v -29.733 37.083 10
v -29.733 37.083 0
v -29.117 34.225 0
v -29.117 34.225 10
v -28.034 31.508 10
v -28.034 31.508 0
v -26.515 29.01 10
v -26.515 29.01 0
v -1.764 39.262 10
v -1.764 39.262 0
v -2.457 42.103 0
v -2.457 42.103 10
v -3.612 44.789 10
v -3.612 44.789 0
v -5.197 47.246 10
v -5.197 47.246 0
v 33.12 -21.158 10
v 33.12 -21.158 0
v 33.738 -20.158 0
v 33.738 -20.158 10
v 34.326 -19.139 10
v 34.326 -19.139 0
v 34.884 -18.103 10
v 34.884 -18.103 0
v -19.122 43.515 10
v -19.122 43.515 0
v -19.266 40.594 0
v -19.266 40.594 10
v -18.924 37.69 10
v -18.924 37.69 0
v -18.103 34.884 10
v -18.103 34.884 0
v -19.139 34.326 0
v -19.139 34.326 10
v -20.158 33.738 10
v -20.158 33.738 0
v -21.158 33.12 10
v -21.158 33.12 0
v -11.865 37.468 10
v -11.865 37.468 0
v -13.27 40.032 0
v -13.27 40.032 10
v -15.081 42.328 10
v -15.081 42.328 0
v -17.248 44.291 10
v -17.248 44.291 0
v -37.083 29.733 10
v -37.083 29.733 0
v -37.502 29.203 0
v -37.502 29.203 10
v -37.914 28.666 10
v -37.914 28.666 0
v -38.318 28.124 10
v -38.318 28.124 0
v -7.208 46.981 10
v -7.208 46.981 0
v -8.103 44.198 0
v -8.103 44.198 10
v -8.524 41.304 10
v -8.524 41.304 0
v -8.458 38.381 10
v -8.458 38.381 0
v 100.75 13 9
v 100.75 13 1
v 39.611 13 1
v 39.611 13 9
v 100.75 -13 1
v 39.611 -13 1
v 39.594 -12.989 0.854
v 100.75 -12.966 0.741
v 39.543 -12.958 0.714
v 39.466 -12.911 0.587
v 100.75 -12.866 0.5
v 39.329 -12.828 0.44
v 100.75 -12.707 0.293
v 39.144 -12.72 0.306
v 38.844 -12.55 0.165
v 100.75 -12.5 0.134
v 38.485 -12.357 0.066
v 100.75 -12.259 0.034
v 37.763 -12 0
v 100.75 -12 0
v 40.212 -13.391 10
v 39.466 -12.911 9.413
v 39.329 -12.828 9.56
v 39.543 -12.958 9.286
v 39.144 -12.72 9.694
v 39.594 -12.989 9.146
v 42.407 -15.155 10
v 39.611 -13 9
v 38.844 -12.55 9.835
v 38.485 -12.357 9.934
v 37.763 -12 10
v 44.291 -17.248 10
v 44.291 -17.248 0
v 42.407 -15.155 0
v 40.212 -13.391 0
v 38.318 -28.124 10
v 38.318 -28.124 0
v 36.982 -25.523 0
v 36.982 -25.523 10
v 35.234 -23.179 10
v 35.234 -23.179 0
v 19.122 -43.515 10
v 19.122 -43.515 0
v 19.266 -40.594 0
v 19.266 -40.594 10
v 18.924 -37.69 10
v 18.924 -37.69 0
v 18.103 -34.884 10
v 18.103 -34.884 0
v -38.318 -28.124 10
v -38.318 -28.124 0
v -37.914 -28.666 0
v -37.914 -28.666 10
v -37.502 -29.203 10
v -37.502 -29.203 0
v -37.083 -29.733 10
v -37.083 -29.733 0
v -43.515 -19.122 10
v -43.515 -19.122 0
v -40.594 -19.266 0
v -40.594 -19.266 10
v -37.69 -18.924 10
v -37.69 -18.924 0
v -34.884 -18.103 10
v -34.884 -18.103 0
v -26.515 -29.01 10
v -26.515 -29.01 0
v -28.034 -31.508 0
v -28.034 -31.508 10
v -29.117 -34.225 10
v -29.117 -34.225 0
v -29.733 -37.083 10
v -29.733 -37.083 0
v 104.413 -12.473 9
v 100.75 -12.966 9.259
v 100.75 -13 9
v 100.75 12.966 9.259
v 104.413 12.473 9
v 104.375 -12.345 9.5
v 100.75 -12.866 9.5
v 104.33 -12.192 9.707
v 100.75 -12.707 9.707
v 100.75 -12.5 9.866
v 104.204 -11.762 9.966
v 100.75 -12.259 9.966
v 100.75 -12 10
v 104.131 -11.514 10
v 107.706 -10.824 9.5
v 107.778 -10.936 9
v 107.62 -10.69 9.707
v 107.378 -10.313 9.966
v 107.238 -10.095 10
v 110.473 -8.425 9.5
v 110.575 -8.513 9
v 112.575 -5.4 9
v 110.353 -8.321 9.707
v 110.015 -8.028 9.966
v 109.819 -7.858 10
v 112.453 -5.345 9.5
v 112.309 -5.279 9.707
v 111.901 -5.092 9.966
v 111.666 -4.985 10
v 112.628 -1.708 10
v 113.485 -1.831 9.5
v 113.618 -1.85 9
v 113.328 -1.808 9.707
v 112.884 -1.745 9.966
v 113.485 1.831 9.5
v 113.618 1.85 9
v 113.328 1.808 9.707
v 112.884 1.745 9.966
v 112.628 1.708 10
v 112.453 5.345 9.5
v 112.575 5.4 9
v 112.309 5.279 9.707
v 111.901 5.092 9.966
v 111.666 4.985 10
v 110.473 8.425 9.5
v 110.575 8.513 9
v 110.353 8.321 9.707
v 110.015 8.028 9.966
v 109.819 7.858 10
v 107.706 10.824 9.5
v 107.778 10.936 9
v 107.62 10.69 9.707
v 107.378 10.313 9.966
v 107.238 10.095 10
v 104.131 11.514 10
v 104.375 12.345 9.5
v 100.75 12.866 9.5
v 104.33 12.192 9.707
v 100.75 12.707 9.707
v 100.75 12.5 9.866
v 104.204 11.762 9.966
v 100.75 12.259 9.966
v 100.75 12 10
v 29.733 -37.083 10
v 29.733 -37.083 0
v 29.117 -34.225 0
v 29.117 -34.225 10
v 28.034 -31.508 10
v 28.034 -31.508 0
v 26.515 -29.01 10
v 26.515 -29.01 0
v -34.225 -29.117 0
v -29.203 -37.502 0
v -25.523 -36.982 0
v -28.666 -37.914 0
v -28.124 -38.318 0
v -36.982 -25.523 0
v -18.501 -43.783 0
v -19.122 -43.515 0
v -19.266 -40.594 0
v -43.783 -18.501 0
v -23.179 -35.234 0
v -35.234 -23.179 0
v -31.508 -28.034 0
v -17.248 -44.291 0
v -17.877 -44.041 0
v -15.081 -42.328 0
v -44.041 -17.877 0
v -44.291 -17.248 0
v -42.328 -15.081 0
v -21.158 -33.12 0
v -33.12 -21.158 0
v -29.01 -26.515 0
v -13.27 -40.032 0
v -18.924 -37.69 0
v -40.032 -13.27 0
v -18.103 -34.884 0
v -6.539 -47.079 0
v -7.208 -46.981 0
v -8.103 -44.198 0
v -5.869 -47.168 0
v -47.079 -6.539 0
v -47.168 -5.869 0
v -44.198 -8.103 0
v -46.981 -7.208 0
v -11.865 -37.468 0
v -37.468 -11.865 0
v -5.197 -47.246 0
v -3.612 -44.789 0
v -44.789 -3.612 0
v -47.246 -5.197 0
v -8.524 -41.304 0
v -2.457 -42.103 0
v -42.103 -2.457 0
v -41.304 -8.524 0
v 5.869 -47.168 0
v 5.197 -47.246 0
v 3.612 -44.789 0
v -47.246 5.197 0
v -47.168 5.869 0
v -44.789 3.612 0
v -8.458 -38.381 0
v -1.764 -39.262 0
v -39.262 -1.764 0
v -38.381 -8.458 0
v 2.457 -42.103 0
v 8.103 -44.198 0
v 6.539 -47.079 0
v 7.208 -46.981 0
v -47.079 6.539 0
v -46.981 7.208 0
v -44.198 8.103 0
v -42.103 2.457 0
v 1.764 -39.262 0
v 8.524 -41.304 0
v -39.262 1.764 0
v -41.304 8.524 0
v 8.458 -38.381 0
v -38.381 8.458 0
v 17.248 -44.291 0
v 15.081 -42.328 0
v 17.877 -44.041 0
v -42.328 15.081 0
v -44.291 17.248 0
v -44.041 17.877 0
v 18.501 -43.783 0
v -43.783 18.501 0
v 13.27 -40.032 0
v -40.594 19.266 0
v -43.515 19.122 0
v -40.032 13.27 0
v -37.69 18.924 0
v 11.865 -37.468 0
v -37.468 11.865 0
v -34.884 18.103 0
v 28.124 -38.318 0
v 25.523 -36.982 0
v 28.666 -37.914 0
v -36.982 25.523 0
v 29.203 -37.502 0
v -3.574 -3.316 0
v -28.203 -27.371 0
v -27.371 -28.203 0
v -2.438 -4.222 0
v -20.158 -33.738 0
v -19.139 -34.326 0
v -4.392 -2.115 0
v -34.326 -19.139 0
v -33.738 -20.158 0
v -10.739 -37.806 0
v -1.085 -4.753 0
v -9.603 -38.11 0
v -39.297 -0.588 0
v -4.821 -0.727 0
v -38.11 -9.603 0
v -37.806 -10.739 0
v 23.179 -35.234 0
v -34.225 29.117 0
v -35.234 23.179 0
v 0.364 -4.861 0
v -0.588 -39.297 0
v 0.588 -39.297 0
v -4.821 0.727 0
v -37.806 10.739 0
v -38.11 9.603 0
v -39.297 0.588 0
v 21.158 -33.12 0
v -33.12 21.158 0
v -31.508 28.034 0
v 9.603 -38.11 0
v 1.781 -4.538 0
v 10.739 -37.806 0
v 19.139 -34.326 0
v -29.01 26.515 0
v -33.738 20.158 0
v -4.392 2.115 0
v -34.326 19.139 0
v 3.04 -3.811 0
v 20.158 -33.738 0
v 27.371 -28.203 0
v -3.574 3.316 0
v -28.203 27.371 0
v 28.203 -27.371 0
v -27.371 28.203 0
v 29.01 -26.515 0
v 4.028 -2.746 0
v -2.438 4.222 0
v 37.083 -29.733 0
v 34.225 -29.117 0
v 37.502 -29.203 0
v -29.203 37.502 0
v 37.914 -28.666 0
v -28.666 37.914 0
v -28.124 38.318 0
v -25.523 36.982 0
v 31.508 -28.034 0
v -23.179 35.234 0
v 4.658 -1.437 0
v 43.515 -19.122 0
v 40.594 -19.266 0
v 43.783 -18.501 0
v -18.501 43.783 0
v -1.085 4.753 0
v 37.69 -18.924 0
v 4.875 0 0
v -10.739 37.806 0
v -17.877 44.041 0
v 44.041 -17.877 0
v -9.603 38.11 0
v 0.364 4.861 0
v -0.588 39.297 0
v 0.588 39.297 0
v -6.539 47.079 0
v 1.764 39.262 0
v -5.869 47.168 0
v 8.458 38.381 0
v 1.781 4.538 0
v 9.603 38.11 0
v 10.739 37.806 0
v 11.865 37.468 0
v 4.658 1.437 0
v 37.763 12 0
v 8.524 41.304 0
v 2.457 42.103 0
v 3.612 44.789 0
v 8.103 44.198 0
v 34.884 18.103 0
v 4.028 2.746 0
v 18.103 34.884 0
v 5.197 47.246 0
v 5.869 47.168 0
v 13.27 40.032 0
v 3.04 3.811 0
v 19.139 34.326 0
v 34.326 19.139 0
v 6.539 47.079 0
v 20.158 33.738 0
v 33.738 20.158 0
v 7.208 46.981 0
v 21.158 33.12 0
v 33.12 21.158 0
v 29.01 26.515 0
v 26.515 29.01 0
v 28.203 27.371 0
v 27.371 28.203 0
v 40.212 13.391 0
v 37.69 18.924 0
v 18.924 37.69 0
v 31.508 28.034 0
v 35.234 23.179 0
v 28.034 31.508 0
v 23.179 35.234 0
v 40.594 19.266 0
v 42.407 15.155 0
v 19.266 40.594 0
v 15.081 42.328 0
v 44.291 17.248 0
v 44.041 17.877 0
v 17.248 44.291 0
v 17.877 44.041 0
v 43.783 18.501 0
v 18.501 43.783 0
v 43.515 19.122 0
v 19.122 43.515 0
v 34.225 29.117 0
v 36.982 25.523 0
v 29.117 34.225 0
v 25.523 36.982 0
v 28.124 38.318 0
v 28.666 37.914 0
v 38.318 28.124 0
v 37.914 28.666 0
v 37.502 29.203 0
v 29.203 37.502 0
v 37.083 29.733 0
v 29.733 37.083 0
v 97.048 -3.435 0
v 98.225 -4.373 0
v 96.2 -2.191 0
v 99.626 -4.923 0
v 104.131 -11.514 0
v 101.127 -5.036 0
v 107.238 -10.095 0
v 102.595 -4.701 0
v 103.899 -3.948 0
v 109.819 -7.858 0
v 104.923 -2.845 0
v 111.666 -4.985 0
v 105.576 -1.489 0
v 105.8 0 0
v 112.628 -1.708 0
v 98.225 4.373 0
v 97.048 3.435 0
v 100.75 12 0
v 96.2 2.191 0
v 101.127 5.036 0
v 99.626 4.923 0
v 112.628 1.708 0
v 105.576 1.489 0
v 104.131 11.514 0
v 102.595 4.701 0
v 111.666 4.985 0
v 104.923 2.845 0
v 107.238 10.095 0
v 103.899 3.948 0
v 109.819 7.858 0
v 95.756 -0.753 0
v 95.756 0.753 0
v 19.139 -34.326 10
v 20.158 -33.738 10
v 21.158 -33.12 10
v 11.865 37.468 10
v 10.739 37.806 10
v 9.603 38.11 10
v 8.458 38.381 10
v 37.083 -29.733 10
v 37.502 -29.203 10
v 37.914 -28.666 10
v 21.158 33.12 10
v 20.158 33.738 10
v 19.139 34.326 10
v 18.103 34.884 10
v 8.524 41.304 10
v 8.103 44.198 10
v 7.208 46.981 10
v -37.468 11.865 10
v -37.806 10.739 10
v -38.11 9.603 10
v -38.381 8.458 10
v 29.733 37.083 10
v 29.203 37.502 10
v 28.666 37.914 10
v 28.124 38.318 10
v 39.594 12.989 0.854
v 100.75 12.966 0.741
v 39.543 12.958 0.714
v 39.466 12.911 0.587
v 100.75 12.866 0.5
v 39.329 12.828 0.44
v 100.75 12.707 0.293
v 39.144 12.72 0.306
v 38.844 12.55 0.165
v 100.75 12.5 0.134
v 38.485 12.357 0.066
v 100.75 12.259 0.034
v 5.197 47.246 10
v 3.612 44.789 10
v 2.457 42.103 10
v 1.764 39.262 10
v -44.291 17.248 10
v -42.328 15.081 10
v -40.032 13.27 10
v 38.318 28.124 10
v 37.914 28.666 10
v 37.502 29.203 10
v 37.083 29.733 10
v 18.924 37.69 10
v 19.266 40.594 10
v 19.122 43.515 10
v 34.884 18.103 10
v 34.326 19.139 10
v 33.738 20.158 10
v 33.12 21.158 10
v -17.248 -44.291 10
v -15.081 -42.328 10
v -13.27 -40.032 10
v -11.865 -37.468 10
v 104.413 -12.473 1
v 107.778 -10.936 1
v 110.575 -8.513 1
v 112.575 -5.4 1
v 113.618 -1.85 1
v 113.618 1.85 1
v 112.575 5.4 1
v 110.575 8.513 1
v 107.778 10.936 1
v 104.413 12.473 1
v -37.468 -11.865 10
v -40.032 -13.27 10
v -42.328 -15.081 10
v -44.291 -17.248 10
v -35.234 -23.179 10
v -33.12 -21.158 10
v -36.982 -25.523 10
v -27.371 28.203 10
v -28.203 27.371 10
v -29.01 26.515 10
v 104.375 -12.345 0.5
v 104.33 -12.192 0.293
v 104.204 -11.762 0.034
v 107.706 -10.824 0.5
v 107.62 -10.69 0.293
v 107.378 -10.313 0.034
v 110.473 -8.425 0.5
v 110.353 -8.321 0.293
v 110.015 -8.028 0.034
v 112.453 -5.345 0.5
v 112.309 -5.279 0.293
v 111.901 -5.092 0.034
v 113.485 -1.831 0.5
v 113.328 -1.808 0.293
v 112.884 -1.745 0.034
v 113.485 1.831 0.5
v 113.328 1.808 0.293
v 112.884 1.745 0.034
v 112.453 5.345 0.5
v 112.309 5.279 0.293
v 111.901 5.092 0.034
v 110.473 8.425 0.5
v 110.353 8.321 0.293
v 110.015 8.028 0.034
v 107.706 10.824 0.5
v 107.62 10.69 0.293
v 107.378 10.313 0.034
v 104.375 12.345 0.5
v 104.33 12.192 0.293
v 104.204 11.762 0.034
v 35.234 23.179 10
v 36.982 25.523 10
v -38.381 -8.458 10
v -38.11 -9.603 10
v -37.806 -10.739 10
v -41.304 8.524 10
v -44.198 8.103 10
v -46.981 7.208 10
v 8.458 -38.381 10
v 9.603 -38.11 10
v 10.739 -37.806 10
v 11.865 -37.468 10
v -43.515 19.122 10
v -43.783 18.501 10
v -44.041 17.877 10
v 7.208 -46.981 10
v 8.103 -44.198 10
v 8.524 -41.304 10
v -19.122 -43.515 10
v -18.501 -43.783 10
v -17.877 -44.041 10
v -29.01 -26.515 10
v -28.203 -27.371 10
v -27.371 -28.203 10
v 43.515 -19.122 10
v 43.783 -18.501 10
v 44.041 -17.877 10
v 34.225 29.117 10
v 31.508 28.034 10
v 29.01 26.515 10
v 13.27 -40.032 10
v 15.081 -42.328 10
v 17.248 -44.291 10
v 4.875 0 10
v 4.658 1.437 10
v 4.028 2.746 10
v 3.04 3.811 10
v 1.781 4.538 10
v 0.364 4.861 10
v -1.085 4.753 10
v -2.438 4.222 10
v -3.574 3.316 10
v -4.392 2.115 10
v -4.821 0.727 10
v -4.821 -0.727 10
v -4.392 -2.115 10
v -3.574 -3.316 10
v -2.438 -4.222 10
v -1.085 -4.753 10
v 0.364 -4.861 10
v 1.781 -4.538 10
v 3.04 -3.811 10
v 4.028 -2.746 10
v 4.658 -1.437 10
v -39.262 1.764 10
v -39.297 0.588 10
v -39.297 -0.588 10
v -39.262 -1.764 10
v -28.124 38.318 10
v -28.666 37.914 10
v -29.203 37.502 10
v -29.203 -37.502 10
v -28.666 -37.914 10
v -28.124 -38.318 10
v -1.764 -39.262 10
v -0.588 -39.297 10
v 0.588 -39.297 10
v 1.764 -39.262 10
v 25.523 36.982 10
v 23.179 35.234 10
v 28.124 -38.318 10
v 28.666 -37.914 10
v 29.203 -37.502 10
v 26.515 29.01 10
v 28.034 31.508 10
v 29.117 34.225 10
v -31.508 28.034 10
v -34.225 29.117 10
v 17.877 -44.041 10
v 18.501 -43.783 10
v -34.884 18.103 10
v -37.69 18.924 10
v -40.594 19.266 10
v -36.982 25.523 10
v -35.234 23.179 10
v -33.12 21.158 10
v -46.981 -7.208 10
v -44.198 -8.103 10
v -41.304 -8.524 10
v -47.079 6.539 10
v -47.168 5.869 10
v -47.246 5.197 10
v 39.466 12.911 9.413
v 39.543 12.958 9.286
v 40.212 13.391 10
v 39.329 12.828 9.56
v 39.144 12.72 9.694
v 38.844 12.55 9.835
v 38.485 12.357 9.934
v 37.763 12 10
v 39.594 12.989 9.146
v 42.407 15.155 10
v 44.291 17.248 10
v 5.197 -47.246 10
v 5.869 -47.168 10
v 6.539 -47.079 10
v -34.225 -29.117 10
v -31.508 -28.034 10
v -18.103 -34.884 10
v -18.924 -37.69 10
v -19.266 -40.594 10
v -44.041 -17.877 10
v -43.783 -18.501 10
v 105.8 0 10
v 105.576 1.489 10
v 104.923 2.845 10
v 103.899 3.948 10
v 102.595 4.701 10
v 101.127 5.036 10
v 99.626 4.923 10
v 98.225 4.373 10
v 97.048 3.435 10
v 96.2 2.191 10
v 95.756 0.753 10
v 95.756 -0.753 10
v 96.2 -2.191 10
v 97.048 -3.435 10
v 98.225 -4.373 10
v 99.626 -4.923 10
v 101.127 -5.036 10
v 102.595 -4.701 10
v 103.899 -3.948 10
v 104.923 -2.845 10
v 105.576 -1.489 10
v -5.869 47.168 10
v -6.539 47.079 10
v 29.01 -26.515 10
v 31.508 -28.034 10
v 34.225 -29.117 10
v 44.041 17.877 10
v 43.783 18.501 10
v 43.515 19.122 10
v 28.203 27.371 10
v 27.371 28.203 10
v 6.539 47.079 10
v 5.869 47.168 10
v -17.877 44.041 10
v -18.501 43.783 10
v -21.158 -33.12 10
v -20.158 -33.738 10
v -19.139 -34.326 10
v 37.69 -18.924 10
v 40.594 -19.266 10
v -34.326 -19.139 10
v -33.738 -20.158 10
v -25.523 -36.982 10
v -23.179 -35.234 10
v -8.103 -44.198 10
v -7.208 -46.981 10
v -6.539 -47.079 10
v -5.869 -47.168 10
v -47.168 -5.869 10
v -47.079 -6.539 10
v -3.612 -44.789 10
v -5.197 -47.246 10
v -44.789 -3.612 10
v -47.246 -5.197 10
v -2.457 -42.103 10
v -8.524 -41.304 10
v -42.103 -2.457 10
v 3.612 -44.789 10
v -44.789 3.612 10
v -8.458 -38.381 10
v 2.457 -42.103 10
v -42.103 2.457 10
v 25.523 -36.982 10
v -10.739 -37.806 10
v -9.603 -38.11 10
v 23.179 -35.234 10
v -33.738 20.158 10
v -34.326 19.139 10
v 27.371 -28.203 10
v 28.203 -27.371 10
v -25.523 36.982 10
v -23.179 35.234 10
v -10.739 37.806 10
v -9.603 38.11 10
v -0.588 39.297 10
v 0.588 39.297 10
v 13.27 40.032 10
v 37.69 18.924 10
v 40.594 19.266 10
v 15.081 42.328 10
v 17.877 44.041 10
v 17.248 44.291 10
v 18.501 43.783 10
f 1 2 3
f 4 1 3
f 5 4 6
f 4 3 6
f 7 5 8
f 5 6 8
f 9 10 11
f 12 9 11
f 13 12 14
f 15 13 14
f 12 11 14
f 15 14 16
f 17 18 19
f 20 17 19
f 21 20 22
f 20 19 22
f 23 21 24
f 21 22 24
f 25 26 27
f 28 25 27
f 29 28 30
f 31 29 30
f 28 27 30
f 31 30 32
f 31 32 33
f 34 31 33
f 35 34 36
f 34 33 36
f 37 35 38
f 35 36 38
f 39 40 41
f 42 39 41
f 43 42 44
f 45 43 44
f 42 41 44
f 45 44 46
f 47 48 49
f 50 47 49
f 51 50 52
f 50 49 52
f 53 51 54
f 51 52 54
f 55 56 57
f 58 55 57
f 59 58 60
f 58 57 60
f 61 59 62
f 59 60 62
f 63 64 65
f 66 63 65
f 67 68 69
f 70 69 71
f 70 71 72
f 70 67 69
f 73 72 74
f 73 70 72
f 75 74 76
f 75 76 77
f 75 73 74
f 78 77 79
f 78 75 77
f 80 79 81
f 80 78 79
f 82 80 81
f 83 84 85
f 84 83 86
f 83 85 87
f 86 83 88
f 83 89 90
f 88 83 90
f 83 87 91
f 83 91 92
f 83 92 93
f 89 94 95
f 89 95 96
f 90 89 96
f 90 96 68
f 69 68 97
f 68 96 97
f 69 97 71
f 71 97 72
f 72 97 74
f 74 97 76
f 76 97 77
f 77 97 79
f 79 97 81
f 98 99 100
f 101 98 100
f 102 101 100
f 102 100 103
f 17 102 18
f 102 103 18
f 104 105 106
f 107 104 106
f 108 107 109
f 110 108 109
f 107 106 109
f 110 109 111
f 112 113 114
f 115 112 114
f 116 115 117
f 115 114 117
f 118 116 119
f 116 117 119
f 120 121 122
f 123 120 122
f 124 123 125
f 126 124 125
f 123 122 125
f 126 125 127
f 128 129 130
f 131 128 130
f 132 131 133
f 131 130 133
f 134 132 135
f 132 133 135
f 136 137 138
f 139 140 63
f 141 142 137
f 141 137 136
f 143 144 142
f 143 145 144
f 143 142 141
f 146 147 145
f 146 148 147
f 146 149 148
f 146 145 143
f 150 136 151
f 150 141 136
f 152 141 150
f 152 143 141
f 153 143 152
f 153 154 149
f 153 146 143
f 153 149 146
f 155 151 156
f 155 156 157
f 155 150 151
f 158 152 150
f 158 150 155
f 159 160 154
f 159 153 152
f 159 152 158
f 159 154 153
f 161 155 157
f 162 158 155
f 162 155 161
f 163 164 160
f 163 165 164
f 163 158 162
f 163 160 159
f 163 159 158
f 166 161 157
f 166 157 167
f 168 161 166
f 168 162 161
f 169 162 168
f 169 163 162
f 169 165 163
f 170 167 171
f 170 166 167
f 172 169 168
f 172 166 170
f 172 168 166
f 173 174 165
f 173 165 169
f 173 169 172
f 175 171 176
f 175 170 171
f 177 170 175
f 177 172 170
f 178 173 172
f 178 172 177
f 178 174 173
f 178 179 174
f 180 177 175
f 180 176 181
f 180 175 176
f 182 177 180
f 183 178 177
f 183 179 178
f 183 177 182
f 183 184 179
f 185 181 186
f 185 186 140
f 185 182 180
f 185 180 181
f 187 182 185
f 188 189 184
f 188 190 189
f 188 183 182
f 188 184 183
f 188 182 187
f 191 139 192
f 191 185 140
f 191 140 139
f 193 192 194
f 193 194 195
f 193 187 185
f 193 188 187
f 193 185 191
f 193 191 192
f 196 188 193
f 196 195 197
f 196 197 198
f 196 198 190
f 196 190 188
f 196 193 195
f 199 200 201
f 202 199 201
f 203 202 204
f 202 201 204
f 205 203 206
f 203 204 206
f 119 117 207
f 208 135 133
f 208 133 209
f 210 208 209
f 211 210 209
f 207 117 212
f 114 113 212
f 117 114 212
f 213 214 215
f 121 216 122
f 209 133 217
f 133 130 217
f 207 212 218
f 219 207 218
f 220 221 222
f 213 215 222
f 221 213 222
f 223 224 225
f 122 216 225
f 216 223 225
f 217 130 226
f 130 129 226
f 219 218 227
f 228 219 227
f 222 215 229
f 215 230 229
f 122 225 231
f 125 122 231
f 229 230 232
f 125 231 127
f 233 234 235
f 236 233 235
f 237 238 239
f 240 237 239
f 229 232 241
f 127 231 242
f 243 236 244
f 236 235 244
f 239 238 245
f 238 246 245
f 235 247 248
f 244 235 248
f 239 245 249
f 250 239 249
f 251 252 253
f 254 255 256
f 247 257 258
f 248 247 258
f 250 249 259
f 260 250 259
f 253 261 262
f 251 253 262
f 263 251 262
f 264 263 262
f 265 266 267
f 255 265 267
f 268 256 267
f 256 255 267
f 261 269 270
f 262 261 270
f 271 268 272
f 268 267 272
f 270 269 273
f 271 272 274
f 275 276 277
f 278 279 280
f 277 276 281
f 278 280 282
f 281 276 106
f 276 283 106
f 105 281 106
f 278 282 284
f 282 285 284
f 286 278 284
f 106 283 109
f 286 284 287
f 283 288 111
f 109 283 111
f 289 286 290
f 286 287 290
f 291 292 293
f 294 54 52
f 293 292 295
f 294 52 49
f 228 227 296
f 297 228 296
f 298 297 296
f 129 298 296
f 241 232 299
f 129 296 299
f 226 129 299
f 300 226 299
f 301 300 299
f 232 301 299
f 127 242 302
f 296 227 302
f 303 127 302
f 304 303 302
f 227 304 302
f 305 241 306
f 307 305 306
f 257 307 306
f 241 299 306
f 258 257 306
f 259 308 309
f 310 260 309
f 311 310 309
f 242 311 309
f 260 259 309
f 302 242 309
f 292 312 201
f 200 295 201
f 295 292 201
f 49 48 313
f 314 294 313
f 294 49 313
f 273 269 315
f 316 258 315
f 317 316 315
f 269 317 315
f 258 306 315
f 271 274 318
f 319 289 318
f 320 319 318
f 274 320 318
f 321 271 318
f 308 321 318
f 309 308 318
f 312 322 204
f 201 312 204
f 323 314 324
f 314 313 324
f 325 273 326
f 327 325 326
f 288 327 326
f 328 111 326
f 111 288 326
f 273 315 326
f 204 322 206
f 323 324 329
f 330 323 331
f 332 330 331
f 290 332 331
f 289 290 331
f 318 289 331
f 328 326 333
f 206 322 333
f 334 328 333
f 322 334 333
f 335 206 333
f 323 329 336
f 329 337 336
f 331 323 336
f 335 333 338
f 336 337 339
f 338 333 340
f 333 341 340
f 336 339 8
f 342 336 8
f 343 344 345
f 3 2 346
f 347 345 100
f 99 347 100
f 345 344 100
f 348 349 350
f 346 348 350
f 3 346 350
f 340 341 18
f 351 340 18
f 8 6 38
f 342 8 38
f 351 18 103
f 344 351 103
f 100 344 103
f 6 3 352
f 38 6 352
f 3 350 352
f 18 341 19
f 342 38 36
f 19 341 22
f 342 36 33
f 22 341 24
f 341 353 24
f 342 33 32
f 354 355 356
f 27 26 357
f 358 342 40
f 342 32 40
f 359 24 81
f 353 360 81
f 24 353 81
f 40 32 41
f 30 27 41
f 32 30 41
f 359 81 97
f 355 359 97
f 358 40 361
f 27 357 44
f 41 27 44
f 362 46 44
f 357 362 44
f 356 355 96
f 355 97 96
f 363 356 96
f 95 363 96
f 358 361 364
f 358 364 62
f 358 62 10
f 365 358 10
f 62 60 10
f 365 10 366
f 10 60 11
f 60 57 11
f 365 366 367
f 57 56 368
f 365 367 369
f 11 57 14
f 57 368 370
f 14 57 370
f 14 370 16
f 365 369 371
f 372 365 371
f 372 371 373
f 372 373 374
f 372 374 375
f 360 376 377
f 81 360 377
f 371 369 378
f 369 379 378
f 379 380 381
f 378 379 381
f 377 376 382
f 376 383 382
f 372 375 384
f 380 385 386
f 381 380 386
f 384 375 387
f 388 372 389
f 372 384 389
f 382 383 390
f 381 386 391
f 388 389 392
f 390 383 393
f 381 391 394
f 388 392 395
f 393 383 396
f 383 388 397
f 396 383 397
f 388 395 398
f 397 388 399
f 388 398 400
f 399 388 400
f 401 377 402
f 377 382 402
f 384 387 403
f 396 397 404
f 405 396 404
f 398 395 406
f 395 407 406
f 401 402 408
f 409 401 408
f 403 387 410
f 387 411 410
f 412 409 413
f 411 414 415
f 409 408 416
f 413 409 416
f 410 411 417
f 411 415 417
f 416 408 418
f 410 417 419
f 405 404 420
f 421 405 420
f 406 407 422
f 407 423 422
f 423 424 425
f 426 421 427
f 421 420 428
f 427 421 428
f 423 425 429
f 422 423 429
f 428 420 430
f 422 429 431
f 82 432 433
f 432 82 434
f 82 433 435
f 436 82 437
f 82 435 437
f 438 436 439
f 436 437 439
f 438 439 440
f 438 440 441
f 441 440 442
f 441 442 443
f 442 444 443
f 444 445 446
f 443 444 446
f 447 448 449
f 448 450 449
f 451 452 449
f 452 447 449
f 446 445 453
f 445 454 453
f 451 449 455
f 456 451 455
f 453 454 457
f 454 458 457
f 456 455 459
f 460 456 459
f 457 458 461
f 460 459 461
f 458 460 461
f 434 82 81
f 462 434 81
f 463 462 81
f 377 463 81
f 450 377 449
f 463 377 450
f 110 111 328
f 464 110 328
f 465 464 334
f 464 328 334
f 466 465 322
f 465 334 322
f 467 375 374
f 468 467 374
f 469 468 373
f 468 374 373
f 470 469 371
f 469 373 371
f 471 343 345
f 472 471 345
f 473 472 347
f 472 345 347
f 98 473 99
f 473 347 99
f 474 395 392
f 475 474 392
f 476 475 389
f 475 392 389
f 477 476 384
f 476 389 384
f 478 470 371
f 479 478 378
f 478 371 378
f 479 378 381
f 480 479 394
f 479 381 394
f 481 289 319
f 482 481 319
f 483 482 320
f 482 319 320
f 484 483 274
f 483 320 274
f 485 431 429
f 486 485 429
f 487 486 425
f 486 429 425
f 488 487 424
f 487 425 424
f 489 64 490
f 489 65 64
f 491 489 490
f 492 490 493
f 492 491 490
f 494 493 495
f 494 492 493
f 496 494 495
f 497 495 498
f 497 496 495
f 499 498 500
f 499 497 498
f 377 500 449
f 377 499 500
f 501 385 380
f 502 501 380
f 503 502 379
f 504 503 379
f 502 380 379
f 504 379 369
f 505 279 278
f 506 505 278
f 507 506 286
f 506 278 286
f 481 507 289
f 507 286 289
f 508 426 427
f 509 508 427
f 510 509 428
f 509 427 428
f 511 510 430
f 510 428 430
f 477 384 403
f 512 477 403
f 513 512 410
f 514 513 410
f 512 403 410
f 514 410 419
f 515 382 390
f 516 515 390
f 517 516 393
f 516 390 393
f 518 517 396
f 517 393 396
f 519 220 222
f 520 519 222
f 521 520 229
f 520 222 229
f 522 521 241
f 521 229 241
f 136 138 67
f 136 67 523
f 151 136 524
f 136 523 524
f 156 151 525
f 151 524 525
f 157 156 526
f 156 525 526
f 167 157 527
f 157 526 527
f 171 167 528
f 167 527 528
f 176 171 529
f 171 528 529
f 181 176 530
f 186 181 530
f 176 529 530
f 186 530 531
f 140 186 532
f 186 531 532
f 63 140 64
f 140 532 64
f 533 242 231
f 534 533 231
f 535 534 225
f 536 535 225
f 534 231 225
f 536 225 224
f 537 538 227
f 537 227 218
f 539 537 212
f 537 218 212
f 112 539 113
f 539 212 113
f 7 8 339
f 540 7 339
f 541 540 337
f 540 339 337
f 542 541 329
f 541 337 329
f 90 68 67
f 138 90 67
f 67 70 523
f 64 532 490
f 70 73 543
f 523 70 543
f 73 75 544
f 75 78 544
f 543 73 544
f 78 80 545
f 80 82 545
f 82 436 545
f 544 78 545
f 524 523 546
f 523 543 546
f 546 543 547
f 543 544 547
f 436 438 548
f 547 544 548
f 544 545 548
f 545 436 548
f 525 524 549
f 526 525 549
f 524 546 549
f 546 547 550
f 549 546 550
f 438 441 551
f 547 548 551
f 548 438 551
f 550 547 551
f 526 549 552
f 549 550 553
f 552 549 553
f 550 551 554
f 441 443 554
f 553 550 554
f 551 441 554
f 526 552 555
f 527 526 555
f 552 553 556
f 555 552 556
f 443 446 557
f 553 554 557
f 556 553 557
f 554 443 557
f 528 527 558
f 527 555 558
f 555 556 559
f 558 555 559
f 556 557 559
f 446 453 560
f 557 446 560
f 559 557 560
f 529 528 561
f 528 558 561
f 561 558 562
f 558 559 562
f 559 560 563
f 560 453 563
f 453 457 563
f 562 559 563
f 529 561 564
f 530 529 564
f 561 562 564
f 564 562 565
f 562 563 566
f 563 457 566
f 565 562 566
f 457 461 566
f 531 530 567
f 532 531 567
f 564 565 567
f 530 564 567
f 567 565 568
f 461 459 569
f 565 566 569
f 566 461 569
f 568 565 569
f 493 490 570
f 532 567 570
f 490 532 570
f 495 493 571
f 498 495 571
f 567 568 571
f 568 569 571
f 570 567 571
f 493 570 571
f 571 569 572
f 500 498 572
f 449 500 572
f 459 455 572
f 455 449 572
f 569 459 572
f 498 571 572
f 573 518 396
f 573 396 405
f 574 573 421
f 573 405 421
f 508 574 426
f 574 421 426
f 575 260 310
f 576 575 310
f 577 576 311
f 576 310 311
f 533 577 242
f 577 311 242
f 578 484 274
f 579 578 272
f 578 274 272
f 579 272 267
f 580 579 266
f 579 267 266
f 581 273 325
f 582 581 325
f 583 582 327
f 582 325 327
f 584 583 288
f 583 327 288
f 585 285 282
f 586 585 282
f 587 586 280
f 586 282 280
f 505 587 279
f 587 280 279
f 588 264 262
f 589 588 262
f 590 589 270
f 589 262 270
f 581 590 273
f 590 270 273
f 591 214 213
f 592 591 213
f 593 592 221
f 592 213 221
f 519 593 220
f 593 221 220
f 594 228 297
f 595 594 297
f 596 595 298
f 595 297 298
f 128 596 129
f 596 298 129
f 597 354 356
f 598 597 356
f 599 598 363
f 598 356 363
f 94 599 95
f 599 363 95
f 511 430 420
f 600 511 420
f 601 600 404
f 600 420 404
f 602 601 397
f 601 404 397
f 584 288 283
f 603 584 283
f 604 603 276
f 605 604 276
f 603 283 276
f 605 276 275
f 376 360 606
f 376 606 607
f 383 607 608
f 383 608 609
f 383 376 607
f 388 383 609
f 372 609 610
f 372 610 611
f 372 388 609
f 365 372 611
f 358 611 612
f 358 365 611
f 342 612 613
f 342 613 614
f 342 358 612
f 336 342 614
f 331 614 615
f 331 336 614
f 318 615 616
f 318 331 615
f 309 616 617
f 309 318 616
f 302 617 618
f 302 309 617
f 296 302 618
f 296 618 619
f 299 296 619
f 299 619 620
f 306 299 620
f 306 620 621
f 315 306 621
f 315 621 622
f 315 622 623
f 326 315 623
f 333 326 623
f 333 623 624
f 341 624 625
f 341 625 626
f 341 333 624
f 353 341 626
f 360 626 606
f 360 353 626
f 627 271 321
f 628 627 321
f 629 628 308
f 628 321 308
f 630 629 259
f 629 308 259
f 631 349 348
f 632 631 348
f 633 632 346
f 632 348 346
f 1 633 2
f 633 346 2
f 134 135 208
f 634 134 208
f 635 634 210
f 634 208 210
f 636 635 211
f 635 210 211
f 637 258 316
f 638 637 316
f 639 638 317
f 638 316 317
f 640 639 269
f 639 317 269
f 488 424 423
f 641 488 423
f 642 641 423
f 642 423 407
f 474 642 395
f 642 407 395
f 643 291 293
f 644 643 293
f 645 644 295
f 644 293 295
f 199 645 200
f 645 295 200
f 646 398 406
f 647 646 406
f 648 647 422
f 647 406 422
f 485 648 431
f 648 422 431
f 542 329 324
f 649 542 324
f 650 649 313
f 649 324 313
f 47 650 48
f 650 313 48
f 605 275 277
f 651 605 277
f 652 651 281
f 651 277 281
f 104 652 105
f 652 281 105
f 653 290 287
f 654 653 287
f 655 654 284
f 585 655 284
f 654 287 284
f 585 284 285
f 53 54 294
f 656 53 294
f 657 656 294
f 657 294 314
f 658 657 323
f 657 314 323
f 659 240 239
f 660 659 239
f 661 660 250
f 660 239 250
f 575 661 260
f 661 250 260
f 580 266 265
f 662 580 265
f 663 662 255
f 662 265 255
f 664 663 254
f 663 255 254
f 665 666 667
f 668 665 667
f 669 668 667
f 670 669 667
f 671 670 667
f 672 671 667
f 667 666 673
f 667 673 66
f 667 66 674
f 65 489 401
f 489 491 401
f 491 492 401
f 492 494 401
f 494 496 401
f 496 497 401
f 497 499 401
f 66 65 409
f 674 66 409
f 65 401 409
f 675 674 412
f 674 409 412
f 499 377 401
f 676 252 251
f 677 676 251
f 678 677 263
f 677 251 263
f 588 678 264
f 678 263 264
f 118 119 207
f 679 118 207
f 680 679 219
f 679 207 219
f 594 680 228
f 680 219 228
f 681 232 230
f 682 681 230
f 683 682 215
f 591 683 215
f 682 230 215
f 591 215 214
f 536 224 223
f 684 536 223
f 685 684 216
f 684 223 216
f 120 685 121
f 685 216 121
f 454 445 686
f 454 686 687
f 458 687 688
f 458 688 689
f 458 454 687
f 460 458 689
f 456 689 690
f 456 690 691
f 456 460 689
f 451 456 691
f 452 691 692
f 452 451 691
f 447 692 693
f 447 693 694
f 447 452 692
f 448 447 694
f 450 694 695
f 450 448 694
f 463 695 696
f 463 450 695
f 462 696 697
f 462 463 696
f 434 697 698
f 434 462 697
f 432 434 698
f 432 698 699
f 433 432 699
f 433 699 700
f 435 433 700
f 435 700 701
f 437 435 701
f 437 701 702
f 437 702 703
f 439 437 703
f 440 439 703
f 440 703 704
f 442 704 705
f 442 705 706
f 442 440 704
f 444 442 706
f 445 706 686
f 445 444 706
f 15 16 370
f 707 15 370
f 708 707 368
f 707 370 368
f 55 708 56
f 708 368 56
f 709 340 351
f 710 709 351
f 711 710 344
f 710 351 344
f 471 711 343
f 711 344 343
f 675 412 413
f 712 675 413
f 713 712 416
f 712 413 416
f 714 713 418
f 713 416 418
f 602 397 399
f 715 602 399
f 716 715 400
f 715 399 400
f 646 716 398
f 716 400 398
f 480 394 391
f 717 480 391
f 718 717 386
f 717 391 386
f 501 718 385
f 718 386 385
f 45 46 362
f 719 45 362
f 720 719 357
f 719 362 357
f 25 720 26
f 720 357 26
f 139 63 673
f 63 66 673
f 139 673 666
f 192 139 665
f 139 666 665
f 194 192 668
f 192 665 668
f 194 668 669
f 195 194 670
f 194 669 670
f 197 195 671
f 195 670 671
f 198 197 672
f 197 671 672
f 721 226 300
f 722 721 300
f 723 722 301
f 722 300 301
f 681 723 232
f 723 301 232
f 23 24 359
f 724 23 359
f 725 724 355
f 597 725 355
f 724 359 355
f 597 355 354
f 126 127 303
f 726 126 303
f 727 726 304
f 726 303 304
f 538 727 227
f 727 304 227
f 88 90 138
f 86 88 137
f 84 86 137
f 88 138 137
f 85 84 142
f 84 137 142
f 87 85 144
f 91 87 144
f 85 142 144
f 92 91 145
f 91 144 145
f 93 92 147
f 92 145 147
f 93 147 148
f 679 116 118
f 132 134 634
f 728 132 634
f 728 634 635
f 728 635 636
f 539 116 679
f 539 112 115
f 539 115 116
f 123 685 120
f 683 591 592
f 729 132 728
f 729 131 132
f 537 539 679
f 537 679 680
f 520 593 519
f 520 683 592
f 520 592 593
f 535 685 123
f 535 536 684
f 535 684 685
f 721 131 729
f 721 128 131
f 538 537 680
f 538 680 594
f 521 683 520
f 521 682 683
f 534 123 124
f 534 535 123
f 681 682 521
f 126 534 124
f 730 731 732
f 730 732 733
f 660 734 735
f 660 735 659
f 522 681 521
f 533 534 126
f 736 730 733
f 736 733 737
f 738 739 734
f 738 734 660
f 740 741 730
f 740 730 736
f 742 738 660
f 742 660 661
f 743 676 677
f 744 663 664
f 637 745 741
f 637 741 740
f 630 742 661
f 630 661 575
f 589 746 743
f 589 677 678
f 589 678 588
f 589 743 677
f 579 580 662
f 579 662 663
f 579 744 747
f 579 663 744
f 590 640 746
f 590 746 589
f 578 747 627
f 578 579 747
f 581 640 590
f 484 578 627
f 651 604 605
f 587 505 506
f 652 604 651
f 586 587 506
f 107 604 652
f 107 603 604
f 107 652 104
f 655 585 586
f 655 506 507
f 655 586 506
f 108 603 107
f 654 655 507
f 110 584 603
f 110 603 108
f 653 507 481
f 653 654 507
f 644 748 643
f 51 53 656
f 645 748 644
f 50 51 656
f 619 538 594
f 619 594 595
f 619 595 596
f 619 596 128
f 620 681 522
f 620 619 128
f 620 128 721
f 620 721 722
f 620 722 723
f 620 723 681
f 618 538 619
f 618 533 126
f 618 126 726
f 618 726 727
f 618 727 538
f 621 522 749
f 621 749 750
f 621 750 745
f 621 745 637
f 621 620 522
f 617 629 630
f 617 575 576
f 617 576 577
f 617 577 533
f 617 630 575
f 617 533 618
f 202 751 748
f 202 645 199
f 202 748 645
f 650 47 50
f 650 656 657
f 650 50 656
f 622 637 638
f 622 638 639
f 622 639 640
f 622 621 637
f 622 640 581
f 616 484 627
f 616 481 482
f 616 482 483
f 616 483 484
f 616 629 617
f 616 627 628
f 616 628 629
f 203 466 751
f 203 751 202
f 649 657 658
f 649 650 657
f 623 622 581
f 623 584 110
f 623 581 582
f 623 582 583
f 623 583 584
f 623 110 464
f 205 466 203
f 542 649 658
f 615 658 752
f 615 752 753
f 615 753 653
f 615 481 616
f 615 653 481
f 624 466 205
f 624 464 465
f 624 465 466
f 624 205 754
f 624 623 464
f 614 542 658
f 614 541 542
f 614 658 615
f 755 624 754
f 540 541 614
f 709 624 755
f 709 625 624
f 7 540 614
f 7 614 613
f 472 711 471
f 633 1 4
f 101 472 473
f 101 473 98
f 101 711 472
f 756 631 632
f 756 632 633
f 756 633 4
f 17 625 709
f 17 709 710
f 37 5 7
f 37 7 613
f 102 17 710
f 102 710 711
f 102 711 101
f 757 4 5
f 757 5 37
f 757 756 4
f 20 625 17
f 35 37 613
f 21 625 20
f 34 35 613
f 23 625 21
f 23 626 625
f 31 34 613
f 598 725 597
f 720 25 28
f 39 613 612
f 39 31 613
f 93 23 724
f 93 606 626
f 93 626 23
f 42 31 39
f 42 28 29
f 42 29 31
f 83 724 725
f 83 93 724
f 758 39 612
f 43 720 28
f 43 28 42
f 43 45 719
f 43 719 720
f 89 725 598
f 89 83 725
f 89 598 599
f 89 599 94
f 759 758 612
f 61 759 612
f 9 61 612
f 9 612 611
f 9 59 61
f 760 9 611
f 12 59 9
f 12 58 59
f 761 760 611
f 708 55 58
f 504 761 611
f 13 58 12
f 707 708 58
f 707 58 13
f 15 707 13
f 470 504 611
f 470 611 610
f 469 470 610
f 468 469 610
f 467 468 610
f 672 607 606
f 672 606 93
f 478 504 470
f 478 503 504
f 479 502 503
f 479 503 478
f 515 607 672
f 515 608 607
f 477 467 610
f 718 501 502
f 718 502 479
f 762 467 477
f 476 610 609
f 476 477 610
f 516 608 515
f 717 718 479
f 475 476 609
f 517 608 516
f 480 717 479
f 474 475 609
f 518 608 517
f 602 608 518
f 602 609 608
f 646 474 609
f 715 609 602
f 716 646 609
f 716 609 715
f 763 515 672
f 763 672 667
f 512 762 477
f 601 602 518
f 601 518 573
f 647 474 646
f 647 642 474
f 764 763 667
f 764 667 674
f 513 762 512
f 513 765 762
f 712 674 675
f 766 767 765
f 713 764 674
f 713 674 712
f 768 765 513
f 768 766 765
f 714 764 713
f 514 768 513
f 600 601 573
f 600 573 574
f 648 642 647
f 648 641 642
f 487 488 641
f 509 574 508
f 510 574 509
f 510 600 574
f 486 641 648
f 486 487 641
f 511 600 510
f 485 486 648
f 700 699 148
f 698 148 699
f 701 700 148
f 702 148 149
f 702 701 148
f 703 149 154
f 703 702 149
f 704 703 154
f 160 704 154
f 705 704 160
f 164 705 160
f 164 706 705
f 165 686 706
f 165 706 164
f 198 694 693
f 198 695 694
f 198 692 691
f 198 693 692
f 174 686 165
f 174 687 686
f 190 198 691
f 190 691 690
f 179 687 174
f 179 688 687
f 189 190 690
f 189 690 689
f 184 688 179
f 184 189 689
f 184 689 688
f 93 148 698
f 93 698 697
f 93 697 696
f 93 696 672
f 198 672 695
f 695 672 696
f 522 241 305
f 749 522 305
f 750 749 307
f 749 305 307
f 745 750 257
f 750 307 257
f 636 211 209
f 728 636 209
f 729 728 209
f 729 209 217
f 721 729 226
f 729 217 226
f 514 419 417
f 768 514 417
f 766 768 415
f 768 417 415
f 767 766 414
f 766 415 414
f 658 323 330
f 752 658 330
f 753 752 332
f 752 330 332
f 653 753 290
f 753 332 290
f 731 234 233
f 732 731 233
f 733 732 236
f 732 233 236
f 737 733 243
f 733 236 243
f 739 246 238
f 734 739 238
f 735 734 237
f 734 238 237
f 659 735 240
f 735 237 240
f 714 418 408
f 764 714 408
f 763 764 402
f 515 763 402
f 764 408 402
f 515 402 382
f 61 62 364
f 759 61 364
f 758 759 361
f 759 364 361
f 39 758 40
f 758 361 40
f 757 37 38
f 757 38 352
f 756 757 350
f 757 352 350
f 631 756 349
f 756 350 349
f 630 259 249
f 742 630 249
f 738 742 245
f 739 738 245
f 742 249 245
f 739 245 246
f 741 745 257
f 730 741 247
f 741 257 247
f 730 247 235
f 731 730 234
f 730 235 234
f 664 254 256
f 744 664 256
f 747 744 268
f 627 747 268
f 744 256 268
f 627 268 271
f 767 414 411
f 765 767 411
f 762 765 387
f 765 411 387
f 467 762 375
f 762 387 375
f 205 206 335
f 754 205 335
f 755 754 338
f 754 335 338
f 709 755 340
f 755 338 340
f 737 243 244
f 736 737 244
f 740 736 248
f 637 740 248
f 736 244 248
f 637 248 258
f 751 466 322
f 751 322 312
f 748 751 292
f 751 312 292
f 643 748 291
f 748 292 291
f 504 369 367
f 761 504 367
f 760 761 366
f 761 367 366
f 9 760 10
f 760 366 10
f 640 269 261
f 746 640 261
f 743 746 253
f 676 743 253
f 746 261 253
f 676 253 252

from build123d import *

# Parameters (mm, degrees)
SKETCH_1_R      = 5.05
SKETCH_1_R_2    = 4.875
EXTRUDE_1_DEPTH = 10
FILLET_1_R      = 1


with BuildPart() as part:
    # 草图1 → 凸台-拉伸1 (new body)
    with BuildSketch(Plane.XY):
        with BuildLine():
            Line((100.75, 13), (39.610949593, 13))
            ThreePointArc((39.610949593, 13), (42.143955384, 14.911655633), (44.291298968, 17.248204611))
            ThreePointArc((44.291298968, 17.248204611), (43.91314903, 18.189421895), (43.515000291, 19.122355404))
            ThreePointArc((43.515000291, 19.122355404), (39.135260233, 19.155630081), (34.883671922, 18.103381529))
            ThreePointArc((34.883671922, 18.103381529), (34.03604328, 19.65071875), (33.119824259, 21.158455298))
            ThreePointArc((33.119824259, 21.158455298), (36.156892392, 24.314314506), (38.317945706, 28.123917996))
            ThreePointArc((38.317945706, 28.123917996), (37.709075956, 28.935191673), (37.083032847, 29.733287767))
            ThreePointArc((37.083032847, 29.733287767), (32.843916692, 28.631868497), (29.009539705, 26.515082418))
            ThreePointArc((29.009539705, 26.515082418), (27.790312967, 27.790312967), (26.515082418, 29.009539705))
            ThreePointArc((26.515082418, 29.009539705), (28.631868497, 32.843916692), (29.733287767, 37.083032847))
            ThreePointArc((29.733287767, 37.083032847), (28.935191673, 37.709075956), (28.123917996, 38.317945706))
            ThreePointArc((28.123917996, 38.317945706), (24.314314506, 36.156892392), (21.158455298, 33.119824259))
            ThreePointArc((21.158455298, 33.119824259), (19.65071875, 34.03604328), (18.103381529, 34.883671922))
            ThreePointArc((18.103381529, 34.883671922), (19.155630081, 39.135260233), (19.122355404, 43.515000291))
            ThreePointArc((19.122355404, 43.515000291), (18.189421895, 43.91314903), (17.248204611, 44.291298968))
            ThreePointArc((17.248204611, 44.291298968), (14.127731967, 41.217883822), (11.865457128, 37.46750481))
            ThreePointArc((11.865457128, 37.46750481), (10.171960525, 37.962273492), (8.457965105, 38.380539546))
            ThreePointArc((8.457965105, 38.380539546), (8.37396713, 42.759600464), (7.208266121, 46.981492378))
            ThreePointArc((7.208266121, 46.981492378), (6.204073074, 47.124613567), (5.197054586, 47.2462734))
            ThreePointArc((5.197054586, 47.2462734), (2.978367841, 43.469944586), (1.763847663, 39.261836826))
            ThreePointArc((1.763847663, 39.261836826), (0, 39.3014375), (-1.763847663, 39.261836826))
            ThreePointArc((-1.763847663, 39.261836826), (-2.978367841, 43.469944586), (-5.197054586, 47.2462734))
            ThreePointArc((-5.197054586, 47.2462734), (-6.204073074, 47.124613567), (-7.208266121, 46.981492378))
            ThreePointArc((-7.208266121, 46.981492378), (-8.37396713, 42.759600464), (-8.457965105, 38.380539546))
            ThreePointArc((-8.457965105, 38.380539546), (-10.171960525, 37.962273492), (-11.865457128, 37.46750481))
            ThreePointArc((-11.865457128, 37.46750481), (-14.127731967, 41.217883822), (-17.248204611, 44.291298968))
            ThreePointArc((-17.248204611, 44.291298968), (-18.189421895, 43.91314903), (-19.122355404, 43.515000291))
            ThreePointArc((-19.122355404, 43.515000291), (-19.155630081, 39.135260233), (-18.103381529, 34.883671922))
            ThreePointArc((-18.103381529, 34.883671922), (-19.65071875, 34.03604328), (-21.158455298, 33.119824259))
            ThreePointArc((-21.158455298, 33.119824259), (-24.314314506, 36.156892392), (-28.123917996, 38.317945706))
            ThreePointArc((-28.123917996, 38.317945706), (-28.935191673, 37.709075956), (-29.733287767, 37.083032847))
            ThreePointArc((-29.733287767, 37.083032847), (-28.631868497, 32.843916692), (-26.515082418, 29.009539705))
            ThreePointArc((-26.515082418, 29.009539705), (-27.790312967, 27.790312967), (-29.009539705, 26.515082418))
            ThreePointArc((-29.009539705, 26.515082418), (-32.843916692, 28.631868497), (-37.083032847, 29.733287767))
            ThreePointArc((-37.083032847, 29.733287767), (-37.709075956, 28.935191673), (-38.317945706, 28.123917996))
            ThreePointArc((-38.317945706, 28.123917996), (-36.156892392, 24.314314506), (-33.119824259, 21.158455298))
            ThreePointArc((-33.119824259, 21.158455298), (-34.03604328, 19.65071875), (-34.883671922, 18.103381529))
            ThreePointArc((-34.883671922, 18.103381529), (-39.135260233, 19.155630081), (-43.515000291, 19.122355404))
            ThreePointArc((-43.515000291, 19.122355404), (-43.91314903, 18.189421895), (-44.291298968, 17.248204611))
            ThreePointArc((-44.291298968, 17.248204611), (-41.217883822, 14.127731967), (-37.46750481, 11.865457128))
            ThreePointArc((-37.46750481, 11.865457128), (-37.962273492, 10.171960525), (-38.380539546, 8.457965105))
            ThreePointArc((-38.380539546, 8.457965105), (-42.759600464, 8.37396713), (-46.981492378, 7.208266121))
            ThreePointArc((-46.981492378, 7.208266121), (-47.124613567, 6.204073074), (-47.2462734, 5.197054586))
            ThreePointArc((-47.2462734, 5.197054586), (-43.469944586, 2.978367841), (-39.261836826, 1.763847663))
            ThreePointArc((-39.261836826, 1.763847663), (-39.3014375, 0), (-39.261836826, -1.763847663))
            ThreePointArc((-39.261836826, -1.763847663), (-43.469944586, -2.978367841), (-47.2462734, -5.197054586))
            ThreePointArc((-47.2462734, -5.197054586), (-47.124613567, -6.204073074), (-46.981492378, -7.208266121))
            ThreePointArc((-46.981492378, -7.208266121), (-42.759600464, -8.37396713), (-38.380539546, -8.457965105))
            ThreePointArc((-38.380539546, -8.457965105), (-37.962273492, -10.171960525), (-37.46750481, -11.865457128))
            ThreePointArc((-37.46750481, -11.865457128), (-41.217883822, -14.127731967), (-44.291298968, -17.248204611))
            ThreePointArc((-44.291298968, -17.248204611), (-43.91314903, -18.189421895), (-43.515000291, -19.122355404))
            ThreePointArc((-43.515000291, -19.122355404), (-39.135260233, -19.155630081), (-34.883671922, -18.103381529))
            ThreePointArc((-34.883671922, -18.103381529), (-34.03604328, -19.65071875), (-33.119824259, -21.158455298))
            ThreePointArc((-33.119824259, -21.158455298), (-36.156892392, -24.314314506), (-38.317945706, -28.123917996))
            ThreePointArc((-38.317945706, -28.123917996), (-37.709075956, -28.935191673), (-37.083032847, -29.733287767))
            ThreePointArc((-37.083032847, -29.733287767), (-32.843916692, -28.631868497), (-29.009539705, -26.515082418))
            ThreePointArc((-29.009539705, -26.515082418), (-27.790312967, -27.790312967), (-26.515082418, -29.009539705))
            ThreePointArc((-26.515082418, -29.009539705), (-28.631868497, -32.843916692), (-29.733287767, -37.083032847))
            ThreePointArc((-29.733287767, -37.083032847), (-28.935191673, -37.709075956), (-28.123917996, -38.317945706))
            ThreePointArc((-28.123917996, -38.317945706), (-24.314314506, -36.156892392), (-21.158455298, -33.119824259))
            ThreePointArc((-21.158455298, -33.119824259), (-19.65071875, -34.03604328), (-18.103381529, -34.883671922))
            ThreePointArc((-18.103381529, -34.883671922), (-19.155630081, -39.135260233), (-19.122355404, -43.515000291))
            ThreePointArc((-19.122355404, -43.515000291), (-18.189421895, -43.91314903), (-17.248204611, -44.291298968))
            ThreePointArc((-17.248204611, -44.291298968), (-14.127731967, -41.217883822), (-11.865457128, -37.46750481))
            ThreePointArc((-11.865457128, -37.46750481), (-10.171960525, -37.962273492), (-8.457965105, -38.380539546))
            ThreePointArc((-8.457965105, -38.380539546), (-8.37396713, -42.759600464), (-7.208266121, -46.981492378))
            ThreePointArc((-7.208266121, -46.981492378), (-6.204073074, -47.124613567), (-5.197054586, -47.2462734))
            ThreePointArc((-5.197054586, -47.2462734), (-2.978367841, -43.469944586), (-1.763847663, -39.261836826))
            ThreePointArc((-1.763847663, -39.261836826), (0, -39.3014375), (1.763847663, -39.261836826))
            ThreePointArc((1.763847663, -39.261836826), (2.978367841, -43.469944586), (5.197054586, -47.2462734))
            ThreePointArc((5.197054586, -47.2462734), (6.204073074, -47.124613567), (7.208266121, -46.981492378))
            ThreePointArc((7.208266121, -46.981492378), (8.37396713, -42.759600464), (8.457965105, -38.380539546))
            ThreePointArc((8.457965105, -38.380539546), (10.171960525, -37.962273492), (11.865457128, -37.46750481))
            ThreePointArc((11.865457128, -37.46750481), (14.127731967, -41.217883822), (17.248204611, -44.291298968))
            ThreePointArc((17.248204611, -44.291298968), (18.189421895, -43.91314903), (19.122355404, -43.515000291))
            ThreePointArc((19.122355404, -43.515000291), (19.155630081, -39.135260233), (18.103381529, -34.883671922))
            ThreePointArc((18.103381529, -34.883671922), (19.65071875, -34.03604328), (21.158455298, -33.119824259))
            ThreePointArc((21.158455298, -33.119824259), (24.314314506, -36.156892392), (28.123917996, -38.317945706))
            ThreePointArc((28.123917996, -38.317945706), (28.935191673, -37.709075956), (29.733287767, -37.083032847))
            ThreePointArc((29.733287767, -37.083032847), (28.631868497, -32.843916692), (26.515082418, -29.009539705))
            ThreePointArc((26.515082418, -29.009539705), (27.790312967, -27.790312967), (29.009539705, -26.515082418))
            ThreePointArc((29.009539705, -26.515082418), (32.843916692, -28.631868497), (37.083032847, -29.733287767))
            ThreePointArc((37.083032847, -29.733287767), (37.709075956, -28.935191673), (38.317945706, -28.123917996))
            ThreePointArc((38.317945706, -28.123917996), (36.156892392, -24.314314506), (33.119824259, -21.158455298))
            ThreePointArc((33.119824259, -21.158455298), (34.03604328, -19.65071875), (34.883671922, -18.103381529))
            ThreePointArc((34.883671922, -18.103381529), (39.135260233, -19.155630081), (43.515000291, -19.122355404))
            ThreePointArc((43.515000291, -19.122355404), (43.91314903, -18.189421895), (44.291298968, -17.248204611))
            ThreePointArc((44.291298968, -17.248204611), (42.143955384, -14.911655633), (39.610949593, -13))
            Line((39.610949593, -13), (100.75, -13))
            ThreePointArc((100.75, -13), (113.75, 0), (100.75, 13))
        make_face()
        with Locations((100.75, 0)):
            Circle(SKETCH_1_R, mode=Mode.SUBTRACT)
        Circle(SKETCH_1_R_2, mode=Mode.SUBTRACT)
    extrude(amount=EXTRUDE_1_DEPTH)

    # 圆角1
    fillet_1_edges = [part.edges().sort_by_distance(p)[0] for p in [
        (70.180474796, 13, 0),
        (113.75, 0, 0),
        (70.180474796, -13, 10),
        (113.75, 0, 10),
        (70.180474796, -13, 0),
        (70.180474796, 13, 10),
    ]]
    fillet(fillet_1_edges, radius=FILLET_1_R)


solid = part.part
